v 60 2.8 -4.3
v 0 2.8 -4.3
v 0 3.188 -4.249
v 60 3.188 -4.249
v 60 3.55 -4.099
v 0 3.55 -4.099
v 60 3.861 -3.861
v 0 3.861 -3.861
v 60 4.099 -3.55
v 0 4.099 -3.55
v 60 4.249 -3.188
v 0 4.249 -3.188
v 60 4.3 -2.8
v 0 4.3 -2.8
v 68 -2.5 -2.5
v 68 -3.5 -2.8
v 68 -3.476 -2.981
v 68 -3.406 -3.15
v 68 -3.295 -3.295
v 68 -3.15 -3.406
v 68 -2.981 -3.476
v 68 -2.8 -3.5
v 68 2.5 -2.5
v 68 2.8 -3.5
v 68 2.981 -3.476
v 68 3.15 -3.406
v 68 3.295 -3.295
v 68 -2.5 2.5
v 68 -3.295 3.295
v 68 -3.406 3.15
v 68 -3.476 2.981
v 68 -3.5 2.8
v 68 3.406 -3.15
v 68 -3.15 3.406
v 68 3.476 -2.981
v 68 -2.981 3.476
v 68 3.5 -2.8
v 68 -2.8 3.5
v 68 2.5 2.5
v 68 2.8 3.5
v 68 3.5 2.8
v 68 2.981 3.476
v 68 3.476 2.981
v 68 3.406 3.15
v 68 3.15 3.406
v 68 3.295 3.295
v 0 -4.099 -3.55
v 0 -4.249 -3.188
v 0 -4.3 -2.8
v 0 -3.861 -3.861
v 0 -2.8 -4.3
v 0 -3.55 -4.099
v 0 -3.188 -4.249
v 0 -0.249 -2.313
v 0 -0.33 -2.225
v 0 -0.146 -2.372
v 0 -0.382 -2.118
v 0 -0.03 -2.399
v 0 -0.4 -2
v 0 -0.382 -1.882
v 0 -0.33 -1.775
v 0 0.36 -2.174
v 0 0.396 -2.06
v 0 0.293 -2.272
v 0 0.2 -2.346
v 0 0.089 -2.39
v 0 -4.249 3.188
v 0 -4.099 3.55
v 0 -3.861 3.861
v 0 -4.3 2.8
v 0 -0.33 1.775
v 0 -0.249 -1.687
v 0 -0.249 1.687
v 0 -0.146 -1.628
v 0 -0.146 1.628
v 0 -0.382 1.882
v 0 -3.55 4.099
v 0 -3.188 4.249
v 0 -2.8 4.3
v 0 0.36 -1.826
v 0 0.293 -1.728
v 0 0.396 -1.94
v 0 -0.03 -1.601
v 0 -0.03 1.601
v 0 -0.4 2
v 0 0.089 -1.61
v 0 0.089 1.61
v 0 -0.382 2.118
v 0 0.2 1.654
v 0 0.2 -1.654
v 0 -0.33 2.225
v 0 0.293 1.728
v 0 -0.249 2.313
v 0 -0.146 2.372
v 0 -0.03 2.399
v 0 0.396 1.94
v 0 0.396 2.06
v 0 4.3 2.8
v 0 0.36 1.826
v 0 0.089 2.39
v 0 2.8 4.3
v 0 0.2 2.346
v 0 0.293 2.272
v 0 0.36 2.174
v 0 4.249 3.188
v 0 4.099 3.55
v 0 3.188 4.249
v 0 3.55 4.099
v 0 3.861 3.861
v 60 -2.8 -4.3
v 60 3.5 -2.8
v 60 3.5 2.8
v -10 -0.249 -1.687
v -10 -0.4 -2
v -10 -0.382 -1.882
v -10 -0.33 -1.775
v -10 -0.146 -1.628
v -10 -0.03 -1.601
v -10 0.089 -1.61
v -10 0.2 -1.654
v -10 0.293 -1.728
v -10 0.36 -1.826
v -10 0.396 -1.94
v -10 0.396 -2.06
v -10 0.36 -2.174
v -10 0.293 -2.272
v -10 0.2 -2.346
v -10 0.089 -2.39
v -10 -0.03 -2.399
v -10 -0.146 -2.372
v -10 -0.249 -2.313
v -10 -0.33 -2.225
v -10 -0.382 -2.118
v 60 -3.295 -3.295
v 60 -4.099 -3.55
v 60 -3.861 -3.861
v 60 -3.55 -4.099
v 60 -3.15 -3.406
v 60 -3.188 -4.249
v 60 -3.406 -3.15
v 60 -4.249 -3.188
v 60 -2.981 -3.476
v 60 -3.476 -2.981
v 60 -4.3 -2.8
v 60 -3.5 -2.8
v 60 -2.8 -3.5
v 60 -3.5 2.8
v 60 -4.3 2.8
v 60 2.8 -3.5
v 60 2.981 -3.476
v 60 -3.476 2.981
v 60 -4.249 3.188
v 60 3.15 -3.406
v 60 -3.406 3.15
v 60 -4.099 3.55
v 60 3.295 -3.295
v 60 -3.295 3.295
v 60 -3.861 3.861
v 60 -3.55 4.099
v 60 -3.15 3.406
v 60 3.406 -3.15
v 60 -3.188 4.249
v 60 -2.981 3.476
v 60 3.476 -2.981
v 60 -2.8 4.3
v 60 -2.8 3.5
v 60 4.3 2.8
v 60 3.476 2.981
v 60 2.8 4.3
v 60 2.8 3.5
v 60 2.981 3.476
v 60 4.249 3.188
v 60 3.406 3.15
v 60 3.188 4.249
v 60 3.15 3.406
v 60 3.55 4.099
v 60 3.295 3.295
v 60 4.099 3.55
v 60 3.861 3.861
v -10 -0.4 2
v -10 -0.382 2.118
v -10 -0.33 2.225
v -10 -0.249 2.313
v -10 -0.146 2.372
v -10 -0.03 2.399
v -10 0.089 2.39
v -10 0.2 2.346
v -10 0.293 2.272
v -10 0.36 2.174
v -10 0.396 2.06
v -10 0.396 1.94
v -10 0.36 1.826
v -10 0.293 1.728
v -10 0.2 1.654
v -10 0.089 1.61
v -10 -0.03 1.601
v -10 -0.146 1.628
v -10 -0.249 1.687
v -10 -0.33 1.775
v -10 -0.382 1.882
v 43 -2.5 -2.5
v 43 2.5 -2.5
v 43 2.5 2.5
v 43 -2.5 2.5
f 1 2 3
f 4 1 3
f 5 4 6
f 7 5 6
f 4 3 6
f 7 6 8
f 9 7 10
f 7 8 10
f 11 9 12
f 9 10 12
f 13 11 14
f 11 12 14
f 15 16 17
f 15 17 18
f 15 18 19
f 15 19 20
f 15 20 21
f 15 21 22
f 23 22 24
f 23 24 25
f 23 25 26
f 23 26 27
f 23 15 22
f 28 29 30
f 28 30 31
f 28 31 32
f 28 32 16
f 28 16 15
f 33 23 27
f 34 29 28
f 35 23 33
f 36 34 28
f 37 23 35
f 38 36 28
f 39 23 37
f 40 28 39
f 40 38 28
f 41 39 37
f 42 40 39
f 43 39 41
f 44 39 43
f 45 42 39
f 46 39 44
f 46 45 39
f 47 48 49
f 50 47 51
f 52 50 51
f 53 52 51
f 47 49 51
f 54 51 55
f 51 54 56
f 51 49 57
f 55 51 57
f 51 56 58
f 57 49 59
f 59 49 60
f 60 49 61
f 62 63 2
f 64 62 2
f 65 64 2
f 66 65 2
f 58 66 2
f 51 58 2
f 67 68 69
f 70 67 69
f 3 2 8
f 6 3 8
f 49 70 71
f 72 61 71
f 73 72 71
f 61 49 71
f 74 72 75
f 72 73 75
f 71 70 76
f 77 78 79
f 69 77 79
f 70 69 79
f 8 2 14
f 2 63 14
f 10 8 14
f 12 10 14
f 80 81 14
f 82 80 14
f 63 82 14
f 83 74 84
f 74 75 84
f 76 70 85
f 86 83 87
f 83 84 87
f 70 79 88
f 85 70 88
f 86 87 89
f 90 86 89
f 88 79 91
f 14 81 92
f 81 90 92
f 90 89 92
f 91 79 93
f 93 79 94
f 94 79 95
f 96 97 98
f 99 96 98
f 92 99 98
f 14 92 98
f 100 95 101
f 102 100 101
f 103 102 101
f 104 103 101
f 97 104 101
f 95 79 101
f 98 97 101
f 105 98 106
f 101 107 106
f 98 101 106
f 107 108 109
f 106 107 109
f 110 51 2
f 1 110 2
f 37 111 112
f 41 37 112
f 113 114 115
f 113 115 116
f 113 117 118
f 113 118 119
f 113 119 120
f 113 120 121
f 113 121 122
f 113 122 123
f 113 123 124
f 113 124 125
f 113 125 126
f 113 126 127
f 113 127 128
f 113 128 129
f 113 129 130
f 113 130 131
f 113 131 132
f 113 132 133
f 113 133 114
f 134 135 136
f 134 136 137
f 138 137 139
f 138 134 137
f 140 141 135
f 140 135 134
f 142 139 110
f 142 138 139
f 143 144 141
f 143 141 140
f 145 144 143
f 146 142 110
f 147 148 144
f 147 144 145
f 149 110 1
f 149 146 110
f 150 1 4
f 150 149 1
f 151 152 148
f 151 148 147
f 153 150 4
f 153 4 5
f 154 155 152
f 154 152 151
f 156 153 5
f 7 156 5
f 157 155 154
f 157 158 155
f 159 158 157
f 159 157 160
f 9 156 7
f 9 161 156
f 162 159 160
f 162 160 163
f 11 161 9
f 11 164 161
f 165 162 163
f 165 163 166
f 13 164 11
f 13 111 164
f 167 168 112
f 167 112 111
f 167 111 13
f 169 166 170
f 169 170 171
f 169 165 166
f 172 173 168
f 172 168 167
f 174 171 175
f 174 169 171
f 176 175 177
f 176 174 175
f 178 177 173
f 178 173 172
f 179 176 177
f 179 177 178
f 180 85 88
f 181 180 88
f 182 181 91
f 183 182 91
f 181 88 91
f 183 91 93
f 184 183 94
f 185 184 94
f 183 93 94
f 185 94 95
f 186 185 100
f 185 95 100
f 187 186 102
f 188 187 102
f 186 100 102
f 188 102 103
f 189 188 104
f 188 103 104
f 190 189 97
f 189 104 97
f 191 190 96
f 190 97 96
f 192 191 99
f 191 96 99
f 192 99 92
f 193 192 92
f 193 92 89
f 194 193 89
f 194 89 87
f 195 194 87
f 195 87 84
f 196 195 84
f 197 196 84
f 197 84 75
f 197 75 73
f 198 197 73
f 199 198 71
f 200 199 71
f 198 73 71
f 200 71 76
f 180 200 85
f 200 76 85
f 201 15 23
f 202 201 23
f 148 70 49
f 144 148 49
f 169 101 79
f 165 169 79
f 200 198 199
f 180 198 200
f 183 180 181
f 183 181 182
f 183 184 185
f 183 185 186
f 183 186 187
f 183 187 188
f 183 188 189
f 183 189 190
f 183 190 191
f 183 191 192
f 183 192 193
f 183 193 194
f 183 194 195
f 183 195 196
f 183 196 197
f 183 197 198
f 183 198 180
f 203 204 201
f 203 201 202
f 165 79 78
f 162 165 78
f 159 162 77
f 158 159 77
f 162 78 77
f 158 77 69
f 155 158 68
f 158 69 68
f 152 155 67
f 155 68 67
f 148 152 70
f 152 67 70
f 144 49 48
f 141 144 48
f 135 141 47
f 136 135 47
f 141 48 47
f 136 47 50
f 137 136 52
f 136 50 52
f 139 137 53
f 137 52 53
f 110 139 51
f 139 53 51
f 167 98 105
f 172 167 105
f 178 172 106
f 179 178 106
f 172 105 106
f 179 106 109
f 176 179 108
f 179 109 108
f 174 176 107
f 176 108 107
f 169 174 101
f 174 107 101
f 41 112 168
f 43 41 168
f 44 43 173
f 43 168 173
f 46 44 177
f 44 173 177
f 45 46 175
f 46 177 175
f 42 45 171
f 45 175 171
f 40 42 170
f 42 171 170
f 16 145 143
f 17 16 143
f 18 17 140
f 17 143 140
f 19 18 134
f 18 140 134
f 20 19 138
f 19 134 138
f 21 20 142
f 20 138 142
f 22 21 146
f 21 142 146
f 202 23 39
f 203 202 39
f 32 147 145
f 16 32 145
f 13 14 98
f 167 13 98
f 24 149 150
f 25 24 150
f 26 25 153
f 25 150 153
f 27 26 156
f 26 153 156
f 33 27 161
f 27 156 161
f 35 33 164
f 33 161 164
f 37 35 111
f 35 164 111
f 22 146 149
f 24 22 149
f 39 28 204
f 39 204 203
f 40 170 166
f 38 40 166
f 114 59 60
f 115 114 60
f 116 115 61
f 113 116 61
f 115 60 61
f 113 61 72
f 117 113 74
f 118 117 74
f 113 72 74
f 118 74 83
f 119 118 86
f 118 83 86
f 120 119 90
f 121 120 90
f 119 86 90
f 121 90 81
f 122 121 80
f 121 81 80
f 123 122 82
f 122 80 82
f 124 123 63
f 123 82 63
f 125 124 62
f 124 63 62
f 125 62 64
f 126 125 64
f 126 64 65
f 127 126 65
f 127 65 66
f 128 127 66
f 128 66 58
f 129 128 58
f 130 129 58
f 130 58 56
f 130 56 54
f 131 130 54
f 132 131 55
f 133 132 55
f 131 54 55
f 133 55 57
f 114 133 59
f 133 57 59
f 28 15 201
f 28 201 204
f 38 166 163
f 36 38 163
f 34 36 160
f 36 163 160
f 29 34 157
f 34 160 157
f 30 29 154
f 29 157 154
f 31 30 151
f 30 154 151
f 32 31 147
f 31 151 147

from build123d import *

# Parameters (mm, degrees)
F1_DEPTH = 60
F3_DEPTH = 8
F4_R     = 0.4
F5_DEPTH = 10
F6_W     = 5
F6_H     = 5
F7_DEPTH = 25


with BuildPart() as f1:
    # F0 (on Right) → F1 (new body)
    with BuildSketch(Plane.YZ):
        with BuildLine():
            ThreePointArc((4.3, 2.8), (3.86066, 3.86066), (2.8, 4.3))
            Line((2.8, 4.3), (-2.8, 4.3))
            ThreePointArc((-2.8, 4.3), (-3.86066, 3.86066), (-4.3, 2.8))
            Line((-4.3, 2.8), (-4.3, -2.8))
            ThreePointArc((-4.3, -2.8), (-3.86066, -3.86066), (-2.8, -4.3))
            Line((-2.8, -4.3), (2.8, -4.3))
            ThreePointArc((2.8, -4.3), (3.86066, -3.86066), (4.3, -2.8))
            Line((4.3, -2.8), (4.3, 2.8))
        make_face()
    extrude(amount=F1_DEPTH)

    # F2 (on face) → F3 (join)
    with BuildSketch(Plane.YZ.offset(60)):
        with BuildLine():
            Line((2.8, 3.5), (-2.8, 3.5))
            ThreePointArc((-2.8, 3.5), (-3.294975, 3.294975), (-3.5, 2.8))
            Line((-3.5, 2.8), (-3.5, -2.8))
            ThreePointArc((-3.5, -2.8), (-3.294975, -3.294975), (-2.8, -3.5))
            Line((-2.8, -3.5), (2.8, -3.5))
            ThreePointArc((2.8, -3.5), (3.294975, -3.294975), (3.5, -2.8))
            Line((3.5, -2.8), (3.5, 2.8))
            ThreePointArc((3.5, 2.8), (3.294975, 3.294975), (2.8, 3.5))
        make_face()
    extrude(amount=F3_DEPTH)

    # F4 (on face) → F5 (join)
    with BuildSketch(Plane(origin=(0, 0, 0), x_dir=(0, -1, 0), z_dir=(-1, 0, 0))):
        with Locations((0, 2)):
            Circle(F4_R)
        with Locations((0, -2)):
            Circle(F4_R)
    extrude(amount=F5_DEPTH)

    # F6 (on face) → F7 (cut)
    with BuildSketch(Plane.YZ.offset(68)):
        Rectangle(F6_W, F6_H)
    extrude(amount=-F7_DEPTH, mode=Mode.SUBTRACT)


solid = f1.part
